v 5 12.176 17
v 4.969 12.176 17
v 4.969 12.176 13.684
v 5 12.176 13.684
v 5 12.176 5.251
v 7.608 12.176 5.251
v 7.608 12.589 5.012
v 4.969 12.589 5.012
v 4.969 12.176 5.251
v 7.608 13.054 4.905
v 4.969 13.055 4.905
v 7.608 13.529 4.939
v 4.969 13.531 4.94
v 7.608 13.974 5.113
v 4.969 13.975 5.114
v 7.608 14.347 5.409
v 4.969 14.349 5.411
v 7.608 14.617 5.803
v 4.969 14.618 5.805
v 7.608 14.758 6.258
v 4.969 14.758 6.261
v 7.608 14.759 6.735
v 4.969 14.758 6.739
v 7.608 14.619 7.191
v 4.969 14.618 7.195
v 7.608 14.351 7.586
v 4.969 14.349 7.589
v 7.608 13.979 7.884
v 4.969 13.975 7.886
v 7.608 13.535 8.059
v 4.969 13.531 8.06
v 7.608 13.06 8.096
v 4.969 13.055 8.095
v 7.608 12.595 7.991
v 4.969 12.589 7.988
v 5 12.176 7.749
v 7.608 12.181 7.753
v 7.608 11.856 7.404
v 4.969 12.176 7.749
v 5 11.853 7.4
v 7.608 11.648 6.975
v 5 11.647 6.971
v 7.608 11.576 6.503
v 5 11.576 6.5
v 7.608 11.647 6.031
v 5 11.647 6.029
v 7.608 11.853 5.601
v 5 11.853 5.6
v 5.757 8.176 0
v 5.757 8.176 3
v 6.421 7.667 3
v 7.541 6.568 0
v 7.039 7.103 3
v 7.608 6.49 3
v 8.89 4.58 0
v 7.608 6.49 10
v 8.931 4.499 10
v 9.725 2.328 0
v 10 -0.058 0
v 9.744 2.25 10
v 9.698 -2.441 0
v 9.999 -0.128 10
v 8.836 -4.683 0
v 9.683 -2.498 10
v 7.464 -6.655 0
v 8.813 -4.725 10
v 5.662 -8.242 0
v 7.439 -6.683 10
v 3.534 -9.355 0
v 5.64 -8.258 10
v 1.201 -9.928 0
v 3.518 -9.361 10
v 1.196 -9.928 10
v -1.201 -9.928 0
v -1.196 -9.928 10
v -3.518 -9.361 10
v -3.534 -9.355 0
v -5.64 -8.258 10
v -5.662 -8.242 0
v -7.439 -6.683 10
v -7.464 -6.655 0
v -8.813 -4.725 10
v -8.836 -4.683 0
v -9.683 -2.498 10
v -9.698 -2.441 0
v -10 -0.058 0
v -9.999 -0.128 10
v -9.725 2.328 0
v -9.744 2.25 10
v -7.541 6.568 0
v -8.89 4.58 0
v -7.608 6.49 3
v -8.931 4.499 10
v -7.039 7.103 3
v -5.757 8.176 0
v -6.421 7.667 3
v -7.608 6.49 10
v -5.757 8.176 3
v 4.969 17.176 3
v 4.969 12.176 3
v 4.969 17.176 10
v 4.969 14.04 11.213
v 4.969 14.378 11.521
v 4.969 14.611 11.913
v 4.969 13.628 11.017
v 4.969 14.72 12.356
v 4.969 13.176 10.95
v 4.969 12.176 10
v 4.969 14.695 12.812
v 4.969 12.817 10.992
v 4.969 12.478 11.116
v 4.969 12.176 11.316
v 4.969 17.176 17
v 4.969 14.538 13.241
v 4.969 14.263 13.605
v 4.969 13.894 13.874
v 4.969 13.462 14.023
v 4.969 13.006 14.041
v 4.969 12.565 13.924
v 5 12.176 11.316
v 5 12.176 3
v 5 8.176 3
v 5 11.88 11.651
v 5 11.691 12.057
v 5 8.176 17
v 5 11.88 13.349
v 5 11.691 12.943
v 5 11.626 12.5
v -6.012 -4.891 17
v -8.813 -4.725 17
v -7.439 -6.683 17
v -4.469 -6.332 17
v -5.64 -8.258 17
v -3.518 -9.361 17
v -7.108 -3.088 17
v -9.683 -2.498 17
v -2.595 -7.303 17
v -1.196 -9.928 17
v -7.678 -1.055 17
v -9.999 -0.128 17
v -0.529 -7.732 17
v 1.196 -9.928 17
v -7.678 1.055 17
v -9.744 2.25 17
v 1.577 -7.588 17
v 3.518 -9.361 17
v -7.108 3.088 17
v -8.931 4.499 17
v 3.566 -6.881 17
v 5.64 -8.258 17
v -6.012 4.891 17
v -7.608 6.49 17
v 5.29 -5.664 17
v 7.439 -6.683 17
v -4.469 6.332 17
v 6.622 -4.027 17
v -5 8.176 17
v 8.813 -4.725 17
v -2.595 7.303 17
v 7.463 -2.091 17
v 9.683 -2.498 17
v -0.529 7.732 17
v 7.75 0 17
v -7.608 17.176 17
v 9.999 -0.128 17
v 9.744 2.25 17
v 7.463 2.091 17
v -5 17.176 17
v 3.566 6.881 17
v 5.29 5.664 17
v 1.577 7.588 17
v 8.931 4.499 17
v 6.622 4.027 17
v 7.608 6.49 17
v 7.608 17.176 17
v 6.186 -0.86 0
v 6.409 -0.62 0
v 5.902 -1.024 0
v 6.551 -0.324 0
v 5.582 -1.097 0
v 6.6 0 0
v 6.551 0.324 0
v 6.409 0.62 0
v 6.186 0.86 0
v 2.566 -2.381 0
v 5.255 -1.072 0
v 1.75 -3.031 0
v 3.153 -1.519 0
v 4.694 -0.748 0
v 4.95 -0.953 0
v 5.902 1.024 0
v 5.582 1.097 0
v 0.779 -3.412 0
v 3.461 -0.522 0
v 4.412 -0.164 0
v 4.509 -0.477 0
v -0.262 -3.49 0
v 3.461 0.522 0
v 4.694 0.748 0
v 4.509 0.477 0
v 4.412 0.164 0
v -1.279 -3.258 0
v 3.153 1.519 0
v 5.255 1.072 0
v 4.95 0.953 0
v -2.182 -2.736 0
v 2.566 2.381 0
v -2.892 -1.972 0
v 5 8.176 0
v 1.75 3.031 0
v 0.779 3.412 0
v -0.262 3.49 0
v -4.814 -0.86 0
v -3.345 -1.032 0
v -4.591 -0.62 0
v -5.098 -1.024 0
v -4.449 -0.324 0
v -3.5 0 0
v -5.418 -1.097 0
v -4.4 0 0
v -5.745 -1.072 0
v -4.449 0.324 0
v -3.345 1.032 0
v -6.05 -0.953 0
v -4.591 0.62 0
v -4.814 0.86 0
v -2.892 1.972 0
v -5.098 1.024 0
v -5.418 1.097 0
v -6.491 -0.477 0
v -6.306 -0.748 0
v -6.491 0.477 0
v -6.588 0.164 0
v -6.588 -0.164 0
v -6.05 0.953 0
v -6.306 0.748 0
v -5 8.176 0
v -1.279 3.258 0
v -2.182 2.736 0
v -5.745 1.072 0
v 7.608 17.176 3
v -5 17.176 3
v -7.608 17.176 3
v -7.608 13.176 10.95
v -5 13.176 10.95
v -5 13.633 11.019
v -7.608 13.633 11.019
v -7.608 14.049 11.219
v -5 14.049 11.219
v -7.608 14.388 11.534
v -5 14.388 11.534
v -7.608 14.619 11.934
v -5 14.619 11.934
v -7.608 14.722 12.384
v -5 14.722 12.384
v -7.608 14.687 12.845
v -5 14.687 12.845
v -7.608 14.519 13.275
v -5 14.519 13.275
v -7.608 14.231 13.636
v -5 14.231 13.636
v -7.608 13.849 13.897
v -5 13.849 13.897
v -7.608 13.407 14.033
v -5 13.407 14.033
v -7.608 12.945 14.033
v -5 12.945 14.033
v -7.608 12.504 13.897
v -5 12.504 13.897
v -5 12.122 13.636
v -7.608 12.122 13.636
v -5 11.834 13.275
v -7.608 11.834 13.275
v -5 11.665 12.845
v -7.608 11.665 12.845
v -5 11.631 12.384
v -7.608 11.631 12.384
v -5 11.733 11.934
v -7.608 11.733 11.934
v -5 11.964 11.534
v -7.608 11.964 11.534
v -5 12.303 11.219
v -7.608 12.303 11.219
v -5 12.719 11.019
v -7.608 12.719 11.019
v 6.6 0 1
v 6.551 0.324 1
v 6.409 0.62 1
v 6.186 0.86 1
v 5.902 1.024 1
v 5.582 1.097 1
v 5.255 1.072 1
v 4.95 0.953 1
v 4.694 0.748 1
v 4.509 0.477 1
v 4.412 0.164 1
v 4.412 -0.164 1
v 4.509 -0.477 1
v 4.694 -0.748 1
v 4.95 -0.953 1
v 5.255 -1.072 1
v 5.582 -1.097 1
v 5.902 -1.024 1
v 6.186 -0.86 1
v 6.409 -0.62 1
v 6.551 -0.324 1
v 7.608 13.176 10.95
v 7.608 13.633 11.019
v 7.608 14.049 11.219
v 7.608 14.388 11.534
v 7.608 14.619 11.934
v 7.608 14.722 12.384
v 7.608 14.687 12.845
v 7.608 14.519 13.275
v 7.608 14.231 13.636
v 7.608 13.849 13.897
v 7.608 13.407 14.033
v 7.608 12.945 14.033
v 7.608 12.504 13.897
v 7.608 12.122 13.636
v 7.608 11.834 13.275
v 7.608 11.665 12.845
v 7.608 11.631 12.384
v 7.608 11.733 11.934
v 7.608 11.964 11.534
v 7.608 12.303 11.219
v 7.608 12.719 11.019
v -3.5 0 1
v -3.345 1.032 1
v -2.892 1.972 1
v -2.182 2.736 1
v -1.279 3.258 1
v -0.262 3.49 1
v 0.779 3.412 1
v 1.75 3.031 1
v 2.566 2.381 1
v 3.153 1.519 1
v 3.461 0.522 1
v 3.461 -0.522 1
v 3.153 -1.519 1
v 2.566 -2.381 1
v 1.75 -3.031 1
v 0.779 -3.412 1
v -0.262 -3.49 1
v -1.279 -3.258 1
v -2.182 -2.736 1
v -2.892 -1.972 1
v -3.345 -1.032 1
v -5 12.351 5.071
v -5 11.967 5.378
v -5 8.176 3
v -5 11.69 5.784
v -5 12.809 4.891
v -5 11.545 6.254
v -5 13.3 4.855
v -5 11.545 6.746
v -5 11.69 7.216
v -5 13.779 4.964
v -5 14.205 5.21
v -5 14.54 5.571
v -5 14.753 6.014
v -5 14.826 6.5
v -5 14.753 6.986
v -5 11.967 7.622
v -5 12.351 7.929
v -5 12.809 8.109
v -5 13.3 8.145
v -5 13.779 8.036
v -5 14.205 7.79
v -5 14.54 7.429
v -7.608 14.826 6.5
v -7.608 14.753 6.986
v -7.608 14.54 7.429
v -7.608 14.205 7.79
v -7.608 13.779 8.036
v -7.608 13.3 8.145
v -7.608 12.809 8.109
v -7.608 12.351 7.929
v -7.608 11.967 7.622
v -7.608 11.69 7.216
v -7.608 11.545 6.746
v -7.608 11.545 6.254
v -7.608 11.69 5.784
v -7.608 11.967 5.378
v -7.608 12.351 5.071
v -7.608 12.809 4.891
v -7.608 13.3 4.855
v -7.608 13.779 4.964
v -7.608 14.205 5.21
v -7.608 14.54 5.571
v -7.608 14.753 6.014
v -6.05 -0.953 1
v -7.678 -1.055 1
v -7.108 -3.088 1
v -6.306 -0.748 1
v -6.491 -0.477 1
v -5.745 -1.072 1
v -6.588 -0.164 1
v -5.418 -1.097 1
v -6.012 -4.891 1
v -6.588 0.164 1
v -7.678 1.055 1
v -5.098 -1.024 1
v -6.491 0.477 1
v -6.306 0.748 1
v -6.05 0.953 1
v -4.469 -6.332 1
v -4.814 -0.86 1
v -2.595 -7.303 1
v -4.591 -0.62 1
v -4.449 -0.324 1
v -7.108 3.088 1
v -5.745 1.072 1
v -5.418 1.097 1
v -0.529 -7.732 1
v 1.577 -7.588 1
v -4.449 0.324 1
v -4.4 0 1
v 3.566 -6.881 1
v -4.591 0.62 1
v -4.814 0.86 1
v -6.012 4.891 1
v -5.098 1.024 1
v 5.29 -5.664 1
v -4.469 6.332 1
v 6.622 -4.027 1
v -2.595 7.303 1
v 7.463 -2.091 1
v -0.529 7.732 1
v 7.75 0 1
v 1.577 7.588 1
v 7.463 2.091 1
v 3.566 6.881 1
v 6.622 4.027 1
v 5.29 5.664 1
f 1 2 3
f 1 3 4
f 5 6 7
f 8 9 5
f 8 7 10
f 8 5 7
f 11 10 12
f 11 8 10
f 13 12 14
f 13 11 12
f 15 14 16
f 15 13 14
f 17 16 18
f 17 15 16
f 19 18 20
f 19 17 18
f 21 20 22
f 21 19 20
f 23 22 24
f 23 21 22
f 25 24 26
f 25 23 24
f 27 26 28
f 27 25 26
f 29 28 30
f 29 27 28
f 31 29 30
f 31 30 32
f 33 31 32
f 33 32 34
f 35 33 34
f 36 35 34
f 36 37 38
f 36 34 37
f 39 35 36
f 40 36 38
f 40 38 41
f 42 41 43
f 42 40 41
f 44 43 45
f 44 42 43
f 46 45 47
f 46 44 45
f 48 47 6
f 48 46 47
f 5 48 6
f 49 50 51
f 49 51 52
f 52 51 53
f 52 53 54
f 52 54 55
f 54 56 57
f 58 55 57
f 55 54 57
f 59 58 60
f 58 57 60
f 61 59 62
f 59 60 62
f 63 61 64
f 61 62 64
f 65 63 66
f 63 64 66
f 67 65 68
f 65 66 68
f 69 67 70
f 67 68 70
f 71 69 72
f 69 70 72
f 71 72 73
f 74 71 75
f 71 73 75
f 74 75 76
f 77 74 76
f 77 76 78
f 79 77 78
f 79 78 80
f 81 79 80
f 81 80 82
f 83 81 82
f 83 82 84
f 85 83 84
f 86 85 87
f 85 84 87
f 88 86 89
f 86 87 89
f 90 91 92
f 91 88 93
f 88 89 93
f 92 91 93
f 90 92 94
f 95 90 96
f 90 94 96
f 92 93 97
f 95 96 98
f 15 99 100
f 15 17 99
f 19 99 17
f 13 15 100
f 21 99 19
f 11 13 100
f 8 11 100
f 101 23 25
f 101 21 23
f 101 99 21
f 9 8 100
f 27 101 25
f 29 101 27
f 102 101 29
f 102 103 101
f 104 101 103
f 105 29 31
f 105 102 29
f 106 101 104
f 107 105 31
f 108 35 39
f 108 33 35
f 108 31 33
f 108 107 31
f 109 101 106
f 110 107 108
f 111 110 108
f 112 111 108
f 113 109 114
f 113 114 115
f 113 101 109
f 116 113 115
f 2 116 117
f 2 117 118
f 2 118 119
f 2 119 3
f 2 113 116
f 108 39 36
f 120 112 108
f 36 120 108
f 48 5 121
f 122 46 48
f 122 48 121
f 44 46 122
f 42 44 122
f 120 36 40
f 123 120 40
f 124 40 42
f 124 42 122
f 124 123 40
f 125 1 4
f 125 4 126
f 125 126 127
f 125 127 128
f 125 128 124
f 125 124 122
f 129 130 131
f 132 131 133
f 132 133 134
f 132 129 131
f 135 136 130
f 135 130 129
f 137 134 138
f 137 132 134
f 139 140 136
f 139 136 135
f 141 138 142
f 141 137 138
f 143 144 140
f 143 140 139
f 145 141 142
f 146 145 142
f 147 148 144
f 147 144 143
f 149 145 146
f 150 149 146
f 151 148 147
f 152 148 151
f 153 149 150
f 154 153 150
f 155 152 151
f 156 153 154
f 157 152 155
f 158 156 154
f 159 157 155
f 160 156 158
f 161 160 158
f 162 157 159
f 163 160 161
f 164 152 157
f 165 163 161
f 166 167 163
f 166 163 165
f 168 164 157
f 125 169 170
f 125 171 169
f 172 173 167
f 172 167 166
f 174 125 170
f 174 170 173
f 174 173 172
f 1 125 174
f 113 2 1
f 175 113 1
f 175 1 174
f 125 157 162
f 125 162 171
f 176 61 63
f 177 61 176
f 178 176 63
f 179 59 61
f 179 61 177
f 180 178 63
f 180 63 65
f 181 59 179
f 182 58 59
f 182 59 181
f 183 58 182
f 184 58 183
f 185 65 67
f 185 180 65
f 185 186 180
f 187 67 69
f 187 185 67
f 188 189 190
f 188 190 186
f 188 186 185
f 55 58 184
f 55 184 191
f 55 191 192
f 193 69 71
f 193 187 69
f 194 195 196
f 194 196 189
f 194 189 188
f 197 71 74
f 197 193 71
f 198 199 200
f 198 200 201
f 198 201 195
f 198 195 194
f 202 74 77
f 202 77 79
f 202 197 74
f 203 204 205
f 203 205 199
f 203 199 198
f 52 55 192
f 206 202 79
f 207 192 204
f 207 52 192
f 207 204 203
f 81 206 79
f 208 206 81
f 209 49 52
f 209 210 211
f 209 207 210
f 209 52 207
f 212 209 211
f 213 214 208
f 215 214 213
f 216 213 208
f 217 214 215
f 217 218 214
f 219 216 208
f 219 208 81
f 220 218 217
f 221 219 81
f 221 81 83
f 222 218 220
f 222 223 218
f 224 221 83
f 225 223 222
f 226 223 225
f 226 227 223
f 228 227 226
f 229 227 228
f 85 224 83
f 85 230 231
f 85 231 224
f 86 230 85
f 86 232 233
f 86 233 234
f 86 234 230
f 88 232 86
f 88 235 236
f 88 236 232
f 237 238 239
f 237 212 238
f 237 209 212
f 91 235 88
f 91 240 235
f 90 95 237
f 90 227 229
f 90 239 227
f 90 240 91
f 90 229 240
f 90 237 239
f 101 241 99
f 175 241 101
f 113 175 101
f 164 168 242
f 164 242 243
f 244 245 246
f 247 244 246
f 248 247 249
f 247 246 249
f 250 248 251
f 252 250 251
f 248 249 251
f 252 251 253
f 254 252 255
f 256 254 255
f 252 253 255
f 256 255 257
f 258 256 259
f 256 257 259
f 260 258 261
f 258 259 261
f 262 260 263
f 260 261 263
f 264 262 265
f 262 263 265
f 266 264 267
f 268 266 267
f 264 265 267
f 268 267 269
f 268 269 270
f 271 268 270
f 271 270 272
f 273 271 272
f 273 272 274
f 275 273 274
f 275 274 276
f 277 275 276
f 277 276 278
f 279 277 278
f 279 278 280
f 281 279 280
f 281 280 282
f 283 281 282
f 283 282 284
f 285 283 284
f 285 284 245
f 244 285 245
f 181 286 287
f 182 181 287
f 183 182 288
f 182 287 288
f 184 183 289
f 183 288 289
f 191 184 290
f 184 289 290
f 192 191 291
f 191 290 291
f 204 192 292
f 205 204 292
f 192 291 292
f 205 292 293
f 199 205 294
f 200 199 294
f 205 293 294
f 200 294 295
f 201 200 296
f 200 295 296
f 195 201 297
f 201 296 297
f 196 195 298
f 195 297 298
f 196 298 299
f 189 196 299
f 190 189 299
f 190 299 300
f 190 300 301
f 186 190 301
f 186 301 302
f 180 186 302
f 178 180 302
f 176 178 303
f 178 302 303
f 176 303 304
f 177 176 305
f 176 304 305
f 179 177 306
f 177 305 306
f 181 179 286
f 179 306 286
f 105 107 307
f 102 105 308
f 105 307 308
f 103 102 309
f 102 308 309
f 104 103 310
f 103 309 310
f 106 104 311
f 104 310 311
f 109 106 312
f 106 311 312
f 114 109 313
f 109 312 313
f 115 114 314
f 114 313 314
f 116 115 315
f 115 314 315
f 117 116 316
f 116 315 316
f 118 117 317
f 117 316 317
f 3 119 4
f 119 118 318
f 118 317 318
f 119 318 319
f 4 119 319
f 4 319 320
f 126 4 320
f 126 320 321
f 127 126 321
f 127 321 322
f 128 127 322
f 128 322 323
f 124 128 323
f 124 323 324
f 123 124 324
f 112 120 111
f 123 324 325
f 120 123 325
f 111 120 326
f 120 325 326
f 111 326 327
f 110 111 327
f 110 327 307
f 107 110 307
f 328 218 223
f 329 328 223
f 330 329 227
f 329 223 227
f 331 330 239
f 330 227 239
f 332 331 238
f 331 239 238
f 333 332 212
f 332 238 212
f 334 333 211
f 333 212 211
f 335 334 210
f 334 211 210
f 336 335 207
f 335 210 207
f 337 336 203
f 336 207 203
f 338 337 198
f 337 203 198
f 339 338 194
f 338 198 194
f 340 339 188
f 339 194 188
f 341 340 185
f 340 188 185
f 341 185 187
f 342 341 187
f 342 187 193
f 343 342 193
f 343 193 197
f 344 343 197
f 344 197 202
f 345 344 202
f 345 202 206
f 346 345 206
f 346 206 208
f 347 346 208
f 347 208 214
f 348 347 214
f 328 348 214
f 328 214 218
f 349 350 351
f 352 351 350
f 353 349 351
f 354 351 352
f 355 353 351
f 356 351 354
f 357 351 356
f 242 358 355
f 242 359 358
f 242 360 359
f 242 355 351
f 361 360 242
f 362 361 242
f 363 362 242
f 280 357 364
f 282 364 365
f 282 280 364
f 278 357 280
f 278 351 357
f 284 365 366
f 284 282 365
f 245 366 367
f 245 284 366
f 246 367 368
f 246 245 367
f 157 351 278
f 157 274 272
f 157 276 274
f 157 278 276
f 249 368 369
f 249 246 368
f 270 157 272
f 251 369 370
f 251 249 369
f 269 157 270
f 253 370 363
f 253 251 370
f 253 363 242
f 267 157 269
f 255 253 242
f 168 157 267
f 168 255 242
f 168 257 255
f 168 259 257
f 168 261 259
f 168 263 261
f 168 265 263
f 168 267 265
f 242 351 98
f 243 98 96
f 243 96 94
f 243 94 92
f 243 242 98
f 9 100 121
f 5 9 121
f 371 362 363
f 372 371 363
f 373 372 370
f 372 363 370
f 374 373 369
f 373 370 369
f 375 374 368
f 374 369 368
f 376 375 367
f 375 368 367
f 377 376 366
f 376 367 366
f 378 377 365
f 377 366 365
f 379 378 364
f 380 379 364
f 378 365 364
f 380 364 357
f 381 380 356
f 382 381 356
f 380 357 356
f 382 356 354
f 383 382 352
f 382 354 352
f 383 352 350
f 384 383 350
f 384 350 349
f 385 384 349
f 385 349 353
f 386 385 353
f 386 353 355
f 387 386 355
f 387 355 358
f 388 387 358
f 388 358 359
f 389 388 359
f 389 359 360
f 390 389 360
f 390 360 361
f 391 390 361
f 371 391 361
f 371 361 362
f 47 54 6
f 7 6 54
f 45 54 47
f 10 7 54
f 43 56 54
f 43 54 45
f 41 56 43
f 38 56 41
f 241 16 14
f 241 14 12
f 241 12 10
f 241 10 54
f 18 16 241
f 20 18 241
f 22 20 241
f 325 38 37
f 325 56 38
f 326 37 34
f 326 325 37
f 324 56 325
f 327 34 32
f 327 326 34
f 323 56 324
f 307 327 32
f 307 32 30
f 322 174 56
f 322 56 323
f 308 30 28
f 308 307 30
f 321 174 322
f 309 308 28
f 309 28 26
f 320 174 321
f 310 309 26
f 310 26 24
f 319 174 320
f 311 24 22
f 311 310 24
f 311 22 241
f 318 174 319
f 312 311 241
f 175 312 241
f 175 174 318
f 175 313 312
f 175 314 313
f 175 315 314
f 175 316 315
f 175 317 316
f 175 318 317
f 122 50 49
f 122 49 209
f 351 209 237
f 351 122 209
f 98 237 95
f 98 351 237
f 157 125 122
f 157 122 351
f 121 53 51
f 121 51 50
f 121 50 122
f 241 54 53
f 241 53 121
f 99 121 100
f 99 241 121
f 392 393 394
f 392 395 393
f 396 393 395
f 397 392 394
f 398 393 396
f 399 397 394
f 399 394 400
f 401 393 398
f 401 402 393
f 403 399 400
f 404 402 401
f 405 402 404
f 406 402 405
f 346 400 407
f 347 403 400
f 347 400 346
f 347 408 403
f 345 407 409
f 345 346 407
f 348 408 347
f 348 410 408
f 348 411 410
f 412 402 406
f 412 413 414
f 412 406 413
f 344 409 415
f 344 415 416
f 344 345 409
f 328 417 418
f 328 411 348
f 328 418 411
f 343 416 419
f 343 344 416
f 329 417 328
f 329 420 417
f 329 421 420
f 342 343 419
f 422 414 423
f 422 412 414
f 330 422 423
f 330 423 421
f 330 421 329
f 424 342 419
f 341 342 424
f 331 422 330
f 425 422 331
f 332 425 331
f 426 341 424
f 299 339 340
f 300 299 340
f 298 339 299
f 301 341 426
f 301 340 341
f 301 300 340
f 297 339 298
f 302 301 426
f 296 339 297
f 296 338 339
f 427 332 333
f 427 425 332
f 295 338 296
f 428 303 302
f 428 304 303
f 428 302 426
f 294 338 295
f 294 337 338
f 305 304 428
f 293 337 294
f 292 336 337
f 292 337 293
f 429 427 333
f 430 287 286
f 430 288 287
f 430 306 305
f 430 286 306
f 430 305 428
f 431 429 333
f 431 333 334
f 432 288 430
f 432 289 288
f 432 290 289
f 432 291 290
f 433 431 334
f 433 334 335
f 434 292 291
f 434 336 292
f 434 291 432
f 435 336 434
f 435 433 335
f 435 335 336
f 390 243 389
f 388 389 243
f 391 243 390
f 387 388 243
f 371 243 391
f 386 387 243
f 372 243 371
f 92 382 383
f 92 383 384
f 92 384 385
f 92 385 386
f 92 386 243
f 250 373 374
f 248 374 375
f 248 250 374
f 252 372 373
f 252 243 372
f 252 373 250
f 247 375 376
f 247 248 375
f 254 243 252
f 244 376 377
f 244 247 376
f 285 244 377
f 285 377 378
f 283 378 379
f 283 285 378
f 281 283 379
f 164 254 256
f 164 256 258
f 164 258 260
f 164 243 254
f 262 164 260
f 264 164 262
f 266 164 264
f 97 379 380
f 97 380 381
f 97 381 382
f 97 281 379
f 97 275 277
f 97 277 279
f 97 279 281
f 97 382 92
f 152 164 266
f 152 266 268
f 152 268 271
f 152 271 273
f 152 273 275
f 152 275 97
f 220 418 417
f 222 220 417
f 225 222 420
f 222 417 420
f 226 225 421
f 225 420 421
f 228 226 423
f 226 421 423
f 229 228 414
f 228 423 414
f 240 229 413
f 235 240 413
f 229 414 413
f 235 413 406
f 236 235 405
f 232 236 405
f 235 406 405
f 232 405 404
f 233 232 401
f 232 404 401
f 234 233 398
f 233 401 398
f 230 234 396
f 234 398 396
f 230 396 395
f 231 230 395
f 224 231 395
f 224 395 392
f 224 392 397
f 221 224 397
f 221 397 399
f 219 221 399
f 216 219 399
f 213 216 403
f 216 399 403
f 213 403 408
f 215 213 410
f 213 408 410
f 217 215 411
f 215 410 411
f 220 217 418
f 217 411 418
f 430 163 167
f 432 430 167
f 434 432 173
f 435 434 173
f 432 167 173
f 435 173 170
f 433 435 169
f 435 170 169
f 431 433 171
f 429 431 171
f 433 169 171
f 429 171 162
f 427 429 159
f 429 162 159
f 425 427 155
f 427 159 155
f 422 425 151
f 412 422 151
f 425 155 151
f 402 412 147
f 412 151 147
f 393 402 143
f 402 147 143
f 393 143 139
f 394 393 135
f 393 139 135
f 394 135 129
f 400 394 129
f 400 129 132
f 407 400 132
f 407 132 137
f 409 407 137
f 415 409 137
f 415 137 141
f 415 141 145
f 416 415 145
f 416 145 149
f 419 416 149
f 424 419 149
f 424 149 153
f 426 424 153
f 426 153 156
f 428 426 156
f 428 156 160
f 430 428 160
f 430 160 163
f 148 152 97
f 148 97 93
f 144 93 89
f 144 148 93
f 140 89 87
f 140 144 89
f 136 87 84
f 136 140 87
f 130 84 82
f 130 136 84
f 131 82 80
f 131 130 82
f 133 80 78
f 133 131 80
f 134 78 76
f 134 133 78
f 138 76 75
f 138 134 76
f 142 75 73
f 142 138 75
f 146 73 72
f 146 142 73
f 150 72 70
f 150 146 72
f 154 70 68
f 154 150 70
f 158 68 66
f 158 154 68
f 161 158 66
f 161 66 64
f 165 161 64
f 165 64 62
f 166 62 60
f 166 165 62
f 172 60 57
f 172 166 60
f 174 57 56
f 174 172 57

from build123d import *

# Parameters (mm, degrees)
SKETCH_1_R           = 14.75
EXTRUDE_1_DEPTH      = 1
SKETCH_2_R           = 1.5
CUT_EXTRUDE_1_DEPTH  = 1
SKETCH_3_R           = 1.1
CUT_EXTRUDE_2_DEPTH  = 1
SKETCH_4_R           = 3.5
CUT_EXTRUDE_3_DEPTH  = 4
SKETCH_5_OUTSIDE_W   = 39.846
SKETCH_5_OUTSIDE_H   = 39.846
SKETCH_5_OUTSIDE_R   = 7
CUT_EXTRUDE_4_DEPTH  = 10
SKETCH_6_R           = 8.75
SKETCH_6_R_2         = 6.75
EXTRUDE_1_2_DEPTH    = 10
SKETCH_7_W           = 20
SKETCH_7_H           = 5.176336695
EXTRUDE_2_DEPTH      = 9
CUT_EXTRUDE_5_DEPTH  = 2
SKETCH_9_W           = 10
SKETCH_9_H           = 4
CUT_EXTRUDE_6_DEPTH  = 12
CHAMFER_START        = 3
CHAMFER_2_DEPTH      = 7
SKETCH_10_W          = 5
SKETCH_10_H          = 7
SKETCH_10_W_2        = 5.030534445
EXTRUDE_3_DEPTH      = 5
SKETCH_11_W          = 0.39232609
SKETCH_11_H          = 7
CUT_EXTRUDE_7_DEPTH  = 22
SKETCH_12_W          = 2
SKETCH_12_H          = 7
CUT_EXTRUDE_8_DEPTH  = 12
SKETCH_13_R          = 1.65
CUT_EXTRUDE_9_DEPTH  = 10
SKETCH_14_R          = 1.6
CUT_EXTRUDE_10_DEPTH = 24
SKETCH_15_R          = 7.75
CUT_EXTRUDE_11_DEPTH = 9
SKETCH_16_R          = 7.75
EXTRUDE_4_DEPTH      = 10
SKETCH_17_W          = 18.442899184
SKETCH_17_H          = 2.260029227
CUT_EXTRUDE_12_DEPTH = 3
EXTRUDE_START        = 7
SKETCH_18_R          = 7.75
EXTRUDE_5_DEPTH      = 7
SKETCH_19_R          = 1.55
CUT_EXTRUDE_13_DEPTH = 17


with BuildPart() as part:
    # 草图1 → Extrude 1 (new body)
    with BuildSketch(Plane.XY):
        Circle(SKETCH_1_R)
    extrude(amount=EXTRUDE_1_DEPTH)

    # 草图2 → 切除-拉伸1 (cut)
    with BuildSketch(Plane.XY.offset(1)):
        with Locations((-11.5, 0)):
            Circle(SKETCH_2_R)
        with Locations((11.5, 0)):
            Circle(SKETCH_2_R)
        with Locations((0, -11.5)):
            Circle(SKETCH_2_R)
    extrude(amount=-CUT_EXTRUDE_1_DEPTH, mode=Mode.SUBTRACT)

    # 草图3 → 切除-拉伸2 (cut)
    with BuildSketch(Plane.XY.offset(1)):
        with Locations((-5.5, 0)):
            Circle(SKETCH_3_R)
        with Locations((5.5, 0)):
            Circle(SKETCH_3_R)
    extrude(amount=-CUT_EXTRUDE_2_DEPTH, mode=Mode.SUBTRACT)

    # 草图4 → 切除-拉伸3 (cut)
    with BuildSketch(Plane(origin=(0, 0, 0), x_dir=(-1, 0, 0), z_dir=(0, 0, -1))):
        Circle(SKETCH_4_R)
    extrude(amount=-CUT_EXTRUDE_3_DEPTH, mode=Mode.SUBTRACT)

    # 草图5 outside → 切除-拉伸4 (cut)
    with BuildSketch(Plane(origin=(0, 0, 0), x_dir=(-1, 0, 0), z_dir=(0, 0, -1))):
        Rectangle(SKETCH_5_OUTSIDE_W, SKETCH_5_OUTSIDE_H)
        Circle(SKETCH_5_OUTSIDE_R, mode=Mode.SUBTRACT)
    extrude(amount=-CUT_EXTRUDE_4_DEPTH, mode=Mode.SUBTRACT)

    # 草图6 → Extrude 1 2 (add)
    with BuildSketch(Plane(origin=(0, 0, 0), x_dir=(-1, 0, 0), z_dir=(0, 0, -1))):
        Circle(SKETCH_6_R)
        Circle(SKETCH_6_R_2, mode=Mode.SUBTRACT)
    extrude(amount=-EXTRUDE_1_2_DEPTH)

    # 草图7 → 凸台-拉伸2 (add)
    with BuildSketch(Plane.XY.offset(1)):
        with Locations((0, 9.588168348)):
            Rectangle(SKETCH_7_W, SKETCH_7_H)
    extrude(amount=EXTRUDE_2_DEPTH)

    # 草图8 → 切除-拉伸5 (cut)
    with BuildSketch(Plane(origin=(0, 0, 1), x_dir=(-1, 0, 0), z_dir=(0, 0, -1))):
        with BuildLine():
            Line((5.25, 7), (10, 7))
            Line((10, 7), (10, 12.176336695))
            Line((10, 12.176336695), (-10, 12.176336695))
            Line((-10, 12.176336695), (-10, 7))
            Line((-10, 7), (-5.25, 7))
            ThreePointArc((-5.25, 7), (0, 8.75), (5.25, 7))
        make_face()
    extrude(amount=-CUT_EXTRUDE_5_DEPTH, mode=Mode.SUBTRACT)

    # 草图9 → 切除-拉伸6 (cut)
    with BuildSketch(Plane.XY.offset(10)):
        with Locations((0, 10.176336695)):
            Rectangle(SKETCH_9_W, SKETCH_9_H)
    extrude(amount=-CUT_EXTRUDE_6_DEPTH, mode=Mode.SUBTRACT)

    # 倒角1
    # the kernel refuses this chamfer: 5, 3.571428571 mm, written as the material it adds along each edge
    with BuildSketch(Plane(origin=(5.25, 7, 10), x_dir=(0.718685473033907, -0.6953353082146982, 0), z_dir=(0, 0, -1))) as chamfer_1_piece_1:
        with BuildLine():
            Line((2.129047938, 0.190960276), (3.191245845, -3.221004807))
            Line((3.191245845, -3.221004807), (3.121712315, -3.292873355))
            ThreePointArc((3.121712315, -3.292873355), (1.559431919, -1.647908743), (-0.069533531, -0.071868547))
            Line((-0.069533531, -0.071868547), (0.012505696, 0.099214956))
            ThreePointArc((0.012505696, 0.099214956), (1.064301984, 0.031360517), (2.116542242, 0.290175233))
            Line((2.116542242, 0.290175233), (2.129047938, 0.190960276))
        make_face()
    extrude(amount=7)

    # 倒角2: read off the stored shape, not the designer's step
    # 倒角2 outline → 倒角2 (add)
    with BuildSketch(Plane.XY.offset(CHAMFER_START)):
        with BuildLine():
            Line((-9.60767391, 7), (-6.822840892, 5.47826087))
            ThreePointArc((-6.822840892, 5.47826087), (-6.084183947, 6.288497889), (-5.25, 7))
            Line((-5.25, 7), (-9.60767391, 7))
        make_face()
    extrude(amount=CHAMFER_2_DEPTH)

    # 草图10 → 凸台-拉伸3 (add)
    with BuildSketch(Plane(origin=(0, 12.176336695, 0), x_dir=(1, 0, 0), z_dir=(0, 1, 0))):
        with Locations((-7.5, -6.5)):
            Rectangle(SKETCH_10_W, SKETCH_10_H)
        with Locations((7.484732777, -6.5)):
            Rectangle(SKETCH_10_W_2, SKETCH_10_H)
    extrude(amount=EXTRUDE_3_DEPTH)

    # 草图11 → 切除-拉伸7 (cut)
    with BuildSketch(Plane.XZ.offset(-7)):
        with Locations((-9.803836955, 6.5)):
            Rectangle(SKETCH_11_W, SKETCH_11_H)
        with Locations((9.803836955, 6.5)):
            Rectangle(SKETCH_11_W, SKETCH_11_H)
    extrude(amount=-CUT_EXTRUDE_7_DEPTH, mode=Mode.SUBTRACT)

    # 草图12 → 切除-拉伸8 (cut)
    with BuildSketch(Plane(origin=(0, 17.176336695, 0), x_dir=(1, 0, 0), z_dir=(0, 1, 0))):
        with Locations((-8.60767391, -6.5)):
            Rectangle(SKETCH_12_W, SKETCH_12_H)
        with Locations((8.60767391, -6.5)):
            Rectangle(SKETCH_12_W, SKETCH_12_H)
    extrude(amount=-CUT_EXTRUDE_8_DEPTH, mode=Mode.SUBTRACT)

    # 草图13 → 切除-拉伸9 (cut)
    with BuildSketch(Plane(origin=(-5, 0, 0), x_dir=(0, 0, -1), z_dir=(1, 0, 0))):
        with Locations(Location((-6.5, 13.176336695, 0), (0, 0, 90))):
            Circle(SKETCH_13_R)
    extrude(amount=-CUT_EXTRUDE_9_DEPTH, mode=Mode.SUBTRACT)

    # 草图14 → 切除-拉伸10 (cut)
    with BuildSketch(Plane(origin=(-5, 0, 0), x_dir=(0, 0, -1), z_dir=(1, 0, 0))):
        with Locations(Location((-6.5, 13.176336695, 0), (0, 0, 321.317812547))):
            Circle(SKETCH_14_R)
    extrude(amount=CUT_EXTRUDE_10_DEPTH, mode=Mode.SUBTRACT)

    # 倒角3
    # the kernel refuses this chamfer: 1, 0.862080288 mm, written as the material it adds along each edge
    with BuildSketch(Plane(origin=(-6.822840892, 5.47826087, 3), x_dir=(-0.8775324532256278, 0.47951725050910476, 0), z_dir=(0, 0, 1))) as chamfer_3_piece_1_section:
        with BuildLine():
            Line((0.991009207, -0.026752196), (0.072738558, 0.799334069))
            Line((0.072738558, 0.799334069), (0.052814761, 0.801078297))
            ThreePointArc((0.052814761, 0.801078297), (0.041497623, 0.398993566), (-0.019689565, 0.00351013))
            Line((-0.019689565, 0.00351013), (0, -0.02))
            ThreePointArc((0, -0.02), (0.495504604, -0.02), (0.991009207, -0.046752196))
            Line((0.991009207, -0.046752196), (0.991009207, -0.026752196))
        make_face()
    chamfer_3_piece_1 = extrude(amount=7, mode=Mode.PRIVATE)
    chamfer_3_piece_1 = split(chamfer_3_piece_1, bisect_by=Plane(origin=(-7.60767391, 5.47826087, 3), z_dir=(1, 0, 0)), keep=Keep.TOP, mode=Mode.PRIVATE)
    add(chamfer_3_piece_1)

    # 倒角4
    # the kernel refuses this chamfer: 1, 0.862080288 mm, written as the material it adds along each edge
    with BuildSketch(Plane(origin=(6.822840893, 5.47826087, 10), x_dir=(0.5907401034808368, -0.8068619027686523, 0), z_dir=(0, 0, -1))) as chamfer_4_piece_1_section:
        with BuildLine():
            Line((0.801958261, 0.032996956), (0.103787295, -0.985922474))
            Line((0.103787295, -0.985922474), (0.083960944, -0.988552263))
            ThreePointArc((0.083960944, -0.988552263), (0.045327257, -0.49383221), (-0.019826352, -0.002629788))
            Line((-0.019826352, -0.002629788), (0.000890684, 0.019980157))
            ThreePointArc((0.000890684, 0.019980157), (0.400985832, 0.011326106), (0.801067577, 0.052977113))
            Line((0.801067577, 0.052977113), (0.801958261, 0.032996956))
        make_face()
    chamfer_4_piece_1 = extrude(amount=7, mode=Mode.PRIVATE)
    chamfer_4_piece_1 = split(chamfer_4_piece_1, bisect_by=Plane(origin=(7.60767391, 5.47826087, 10), z_dir=(-1, 0, 0)), keep=Keep.TOP, mode=Mode.PRIVATE)
    add(chamfer_4_piece_1)

    # 草图15 → 切除-拉伸11 (cut)
    with BuildSketch(Plane.XY.offset(10)):
        Circle(SKETCH_15_R)
    extrude(amount=-CUT_EXTRUDE_11_DEPTH, mode=Mode.SUBTRACT)

    # 草图16 → 凸台-拉伸4 (add)
    with BuildSketch(Plane.XY.offset(10)):
        with BuildLine():
            Line((-5, 8.660254038), (-5, 8.176336695))
            Line((-5, 8.176336695), (5, 8.176336695))
            Line((5, 8.176336695), (5, 8.660254038))
            ThreePointArc((5, 8.660254038), (0, -10), (-5, 8.660254038))
        make_face()
        Circle(SKETCH_16_R, mode=Mode.SUBTRACT)
    extrude(amount=-EXTRUDE_4_DEPTH)

    # 草图17 → 切除-拉伸12 (cut)
    with BuildSketch(Plane(origin=(0, 0, 0), x_dir=(-1, 0, 0), z_dir=(0, 0, -1))):
        with Locations((-0.125316737, 9.306351309)):
            Rectangle(SKETCH_17_W, SKETCH_17_H)
    extrude(amount=-CUT_EXTRUDE_12_DEPTH, mode=Mode.SUBTRACT)

    # 草图18 → 凸台-拉伸5 (add)
    with BuildSketch(Plane.XY.offset(10).offset(EXTRUDE_START)):
        with BuildLine():
            Line((-5, 17.176336695), (-7.60767391, 17.176336695))
            Line((-7.60767391, 17.176336695), (-7.60767391, 6.49024635))
            ThreePointArc((-7.60767391, 6.49024635), (0, -10), (7.60767391, 6.49024635))
            Line((7.60767391, 6.49024635), (7.60767391, 17.176336695))
            Line((7.60767391, 17.176336695), (4.969465555, 17.176336695))
            Line((4.969465555, 17.176336695), (4.969465555, 12.176336695))
            Line((4.969465555, 12.176336695), (5, 12.176336695))
            Line((5, 12.176336695), (5, 8.176336695))
            Line((5, 8.176336695), (-5, 8.176336695))
            Line((-5, 8.176336695), (-5, 17.176336695))
        make_face()
        Circle(SKETCH_18_R, mode=Mode.SUBTRACT)
    extrude(amount=-EXTRUDE_5_DEPTH)

    # 草图19 → 切除-拉伸13 (cut)
    with BuildSketch(Plane(origin=(7.60767391, 0, 0), x_dir=(0, 0, -1), z_dir=(1, 0, 0))):
        with Locations((-12.5, 13.176336695)):
            Circle(SKETCH_19_R)
    extrude(amount=-CUT_EXTRUDE_13_DEPTH, mode=Mode.SUBTRACT)


solid = part.part
